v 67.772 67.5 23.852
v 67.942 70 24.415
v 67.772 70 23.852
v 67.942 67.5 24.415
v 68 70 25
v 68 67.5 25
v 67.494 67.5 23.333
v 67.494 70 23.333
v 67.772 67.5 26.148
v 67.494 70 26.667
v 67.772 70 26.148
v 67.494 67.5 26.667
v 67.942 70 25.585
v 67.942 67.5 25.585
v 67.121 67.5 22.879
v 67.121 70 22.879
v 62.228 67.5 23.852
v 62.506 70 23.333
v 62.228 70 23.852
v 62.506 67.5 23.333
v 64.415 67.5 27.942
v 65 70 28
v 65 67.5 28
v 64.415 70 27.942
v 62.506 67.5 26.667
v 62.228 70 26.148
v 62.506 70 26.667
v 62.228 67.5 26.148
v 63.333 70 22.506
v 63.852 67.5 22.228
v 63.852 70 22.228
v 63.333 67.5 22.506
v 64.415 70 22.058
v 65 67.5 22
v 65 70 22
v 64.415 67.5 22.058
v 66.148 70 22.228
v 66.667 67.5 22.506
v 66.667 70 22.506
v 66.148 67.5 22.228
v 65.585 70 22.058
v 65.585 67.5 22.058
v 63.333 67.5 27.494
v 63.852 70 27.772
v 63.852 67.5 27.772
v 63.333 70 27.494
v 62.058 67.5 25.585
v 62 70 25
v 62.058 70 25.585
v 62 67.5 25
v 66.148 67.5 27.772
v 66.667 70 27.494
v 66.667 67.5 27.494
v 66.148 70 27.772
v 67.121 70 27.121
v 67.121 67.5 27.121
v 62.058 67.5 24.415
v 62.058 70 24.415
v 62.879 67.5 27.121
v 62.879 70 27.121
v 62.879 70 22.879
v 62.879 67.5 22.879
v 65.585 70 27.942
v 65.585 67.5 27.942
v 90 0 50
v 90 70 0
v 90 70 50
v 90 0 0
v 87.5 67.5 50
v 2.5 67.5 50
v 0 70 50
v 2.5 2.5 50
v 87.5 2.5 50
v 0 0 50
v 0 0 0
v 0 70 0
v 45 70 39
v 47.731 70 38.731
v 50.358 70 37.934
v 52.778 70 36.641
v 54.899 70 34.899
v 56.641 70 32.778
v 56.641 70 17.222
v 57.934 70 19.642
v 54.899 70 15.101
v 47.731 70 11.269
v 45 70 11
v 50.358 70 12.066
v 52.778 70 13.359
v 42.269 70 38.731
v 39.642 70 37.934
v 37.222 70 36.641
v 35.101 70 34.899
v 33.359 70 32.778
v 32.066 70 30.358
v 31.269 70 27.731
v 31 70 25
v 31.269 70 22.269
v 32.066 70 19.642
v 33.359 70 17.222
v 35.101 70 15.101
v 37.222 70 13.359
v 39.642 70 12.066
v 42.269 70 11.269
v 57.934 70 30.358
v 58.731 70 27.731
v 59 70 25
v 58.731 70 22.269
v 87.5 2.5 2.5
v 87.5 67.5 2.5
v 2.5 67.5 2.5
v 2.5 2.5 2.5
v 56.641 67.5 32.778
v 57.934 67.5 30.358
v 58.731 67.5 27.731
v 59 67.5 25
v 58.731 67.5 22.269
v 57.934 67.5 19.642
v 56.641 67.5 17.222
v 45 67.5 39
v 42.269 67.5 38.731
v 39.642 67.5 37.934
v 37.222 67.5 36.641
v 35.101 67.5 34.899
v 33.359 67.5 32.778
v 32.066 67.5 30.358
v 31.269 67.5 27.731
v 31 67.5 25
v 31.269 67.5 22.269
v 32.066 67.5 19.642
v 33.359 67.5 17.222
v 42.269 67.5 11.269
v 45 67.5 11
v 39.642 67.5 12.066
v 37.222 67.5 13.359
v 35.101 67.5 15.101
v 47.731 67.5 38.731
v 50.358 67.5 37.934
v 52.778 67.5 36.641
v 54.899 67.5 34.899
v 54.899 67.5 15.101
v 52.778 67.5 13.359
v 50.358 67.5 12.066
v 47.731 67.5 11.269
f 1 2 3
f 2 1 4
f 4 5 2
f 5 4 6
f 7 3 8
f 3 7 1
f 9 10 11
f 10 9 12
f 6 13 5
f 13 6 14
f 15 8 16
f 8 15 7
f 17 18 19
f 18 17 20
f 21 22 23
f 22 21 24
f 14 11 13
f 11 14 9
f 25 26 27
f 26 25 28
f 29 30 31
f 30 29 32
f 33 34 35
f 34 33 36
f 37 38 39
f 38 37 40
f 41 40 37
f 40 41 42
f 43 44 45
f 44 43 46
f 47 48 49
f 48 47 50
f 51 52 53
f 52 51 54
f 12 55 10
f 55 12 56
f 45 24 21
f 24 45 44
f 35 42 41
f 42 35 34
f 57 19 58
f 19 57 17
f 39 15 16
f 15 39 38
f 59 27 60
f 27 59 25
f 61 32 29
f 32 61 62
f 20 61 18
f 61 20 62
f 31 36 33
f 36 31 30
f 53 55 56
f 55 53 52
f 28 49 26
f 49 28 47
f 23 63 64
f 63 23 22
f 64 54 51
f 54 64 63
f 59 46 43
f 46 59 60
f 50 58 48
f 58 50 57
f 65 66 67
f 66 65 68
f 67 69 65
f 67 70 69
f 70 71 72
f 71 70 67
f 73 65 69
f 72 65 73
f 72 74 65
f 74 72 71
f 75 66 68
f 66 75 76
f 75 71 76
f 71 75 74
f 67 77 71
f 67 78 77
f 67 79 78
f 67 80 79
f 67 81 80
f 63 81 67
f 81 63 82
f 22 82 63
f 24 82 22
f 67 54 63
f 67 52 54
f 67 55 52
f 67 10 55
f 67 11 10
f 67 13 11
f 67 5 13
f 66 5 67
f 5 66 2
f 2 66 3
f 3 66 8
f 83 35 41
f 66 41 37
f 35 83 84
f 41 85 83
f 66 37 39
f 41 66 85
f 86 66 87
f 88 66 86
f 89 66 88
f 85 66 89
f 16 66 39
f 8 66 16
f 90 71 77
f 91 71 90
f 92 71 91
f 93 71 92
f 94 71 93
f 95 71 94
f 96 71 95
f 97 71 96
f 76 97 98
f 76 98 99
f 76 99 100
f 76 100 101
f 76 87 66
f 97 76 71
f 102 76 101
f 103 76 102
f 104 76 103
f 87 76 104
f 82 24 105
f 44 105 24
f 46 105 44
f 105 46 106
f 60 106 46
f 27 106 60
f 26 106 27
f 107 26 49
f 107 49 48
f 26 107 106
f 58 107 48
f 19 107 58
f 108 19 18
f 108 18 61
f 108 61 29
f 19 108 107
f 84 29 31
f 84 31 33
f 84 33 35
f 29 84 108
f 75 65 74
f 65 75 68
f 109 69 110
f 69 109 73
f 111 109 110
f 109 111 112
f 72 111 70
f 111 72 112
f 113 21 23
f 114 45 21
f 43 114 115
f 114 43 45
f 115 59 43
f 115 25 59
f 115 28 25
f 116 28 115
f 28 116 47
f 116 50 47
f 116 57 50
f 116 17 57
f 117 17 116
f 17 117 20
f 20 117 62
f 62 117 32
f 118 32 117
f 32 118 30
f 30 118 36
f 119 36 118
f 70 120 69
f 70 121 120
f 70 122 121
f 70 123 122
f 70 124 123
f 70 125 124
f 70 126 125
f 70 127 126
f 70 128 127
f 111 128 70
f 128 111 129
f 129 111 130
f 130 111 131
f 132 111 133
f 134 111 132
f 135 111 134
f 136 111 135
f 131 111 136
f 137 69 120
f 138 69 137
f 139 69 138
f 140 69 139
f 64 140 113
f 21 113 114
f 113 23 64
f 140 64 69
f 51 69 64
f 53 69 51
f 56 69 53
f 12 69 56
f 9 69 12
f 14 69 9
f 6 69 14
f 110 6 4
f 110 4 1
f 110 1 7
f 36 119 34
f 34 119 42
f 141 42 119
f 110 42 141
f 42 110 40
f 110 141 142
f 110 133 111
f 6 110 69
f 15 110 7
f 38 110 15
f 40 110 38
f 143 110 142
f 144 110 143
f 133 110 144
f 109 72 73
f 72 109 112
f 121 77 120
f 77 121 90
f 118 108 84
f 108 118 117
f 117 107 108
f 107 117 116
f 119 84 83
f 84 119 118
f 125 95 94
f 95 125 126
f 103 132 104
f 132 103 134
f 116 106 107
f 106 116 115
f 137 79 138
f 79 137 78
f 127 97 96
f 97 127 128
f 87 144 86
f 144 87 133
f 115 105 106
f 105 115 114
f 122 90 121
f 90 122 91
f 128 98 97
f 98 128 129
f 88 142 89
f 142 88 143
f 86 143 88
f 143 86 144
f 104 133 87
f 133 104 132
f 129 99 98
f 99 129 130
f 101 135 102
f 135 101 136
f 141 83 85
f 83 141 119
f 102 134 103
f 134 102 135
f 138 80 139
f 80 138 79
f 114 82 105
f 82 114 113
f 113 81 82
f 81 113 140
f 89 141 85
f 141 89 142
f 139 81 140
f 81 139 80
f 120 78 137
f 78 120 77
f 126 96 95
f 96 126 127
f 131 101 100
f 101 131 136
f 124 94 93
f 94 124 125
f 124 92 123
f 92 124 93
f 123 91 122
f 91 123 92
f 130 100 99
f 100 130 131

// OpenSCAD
$fn = 32;

// ----------------------------------------------------------------------
// Vent box: roundvent enclosure
// ----------------------------------------------------------------------

// --- parameters (mm) ---
box_l = 90;               // box length, X
box_w = 70;               // box width, Y
box_h = 50;               // box height, Z
wall_t = 2.5;             // shell wall thickness
vent_d = 28;              // central vent diameter
ring_d = 6;               // ring hole diameter
n_ring = 6;               // holes in the ring
ring_r = 20;              // ring radius

ring_step = 360 / n_ring;  // ring hole angular step

difference() {
  cube([box_l, box_w, box_h]);
  translate([wall_t, wall_t, wall_t])
    cube([box_l - 2 * wall_t, box_w - 2 * wall_t, box_h]);
  translate([box_l / 2, box_w - wall_t - 1, box_h / 2])
    rotate([-90, 0, 0]) cylinder(h = wall_t + 2, d = vent_d);
  for (i = [0 : n_ring - 1])
    translate([box_l / 2, box_w - wall_t - 1, box_h / 2])
      rotate([0, 0, i * ring_step])
        translate([ring_r, 0, 0]) rotate([-90, 0, 0])
          cylinder(h = wall_t + 2, d = ring_d);
}
